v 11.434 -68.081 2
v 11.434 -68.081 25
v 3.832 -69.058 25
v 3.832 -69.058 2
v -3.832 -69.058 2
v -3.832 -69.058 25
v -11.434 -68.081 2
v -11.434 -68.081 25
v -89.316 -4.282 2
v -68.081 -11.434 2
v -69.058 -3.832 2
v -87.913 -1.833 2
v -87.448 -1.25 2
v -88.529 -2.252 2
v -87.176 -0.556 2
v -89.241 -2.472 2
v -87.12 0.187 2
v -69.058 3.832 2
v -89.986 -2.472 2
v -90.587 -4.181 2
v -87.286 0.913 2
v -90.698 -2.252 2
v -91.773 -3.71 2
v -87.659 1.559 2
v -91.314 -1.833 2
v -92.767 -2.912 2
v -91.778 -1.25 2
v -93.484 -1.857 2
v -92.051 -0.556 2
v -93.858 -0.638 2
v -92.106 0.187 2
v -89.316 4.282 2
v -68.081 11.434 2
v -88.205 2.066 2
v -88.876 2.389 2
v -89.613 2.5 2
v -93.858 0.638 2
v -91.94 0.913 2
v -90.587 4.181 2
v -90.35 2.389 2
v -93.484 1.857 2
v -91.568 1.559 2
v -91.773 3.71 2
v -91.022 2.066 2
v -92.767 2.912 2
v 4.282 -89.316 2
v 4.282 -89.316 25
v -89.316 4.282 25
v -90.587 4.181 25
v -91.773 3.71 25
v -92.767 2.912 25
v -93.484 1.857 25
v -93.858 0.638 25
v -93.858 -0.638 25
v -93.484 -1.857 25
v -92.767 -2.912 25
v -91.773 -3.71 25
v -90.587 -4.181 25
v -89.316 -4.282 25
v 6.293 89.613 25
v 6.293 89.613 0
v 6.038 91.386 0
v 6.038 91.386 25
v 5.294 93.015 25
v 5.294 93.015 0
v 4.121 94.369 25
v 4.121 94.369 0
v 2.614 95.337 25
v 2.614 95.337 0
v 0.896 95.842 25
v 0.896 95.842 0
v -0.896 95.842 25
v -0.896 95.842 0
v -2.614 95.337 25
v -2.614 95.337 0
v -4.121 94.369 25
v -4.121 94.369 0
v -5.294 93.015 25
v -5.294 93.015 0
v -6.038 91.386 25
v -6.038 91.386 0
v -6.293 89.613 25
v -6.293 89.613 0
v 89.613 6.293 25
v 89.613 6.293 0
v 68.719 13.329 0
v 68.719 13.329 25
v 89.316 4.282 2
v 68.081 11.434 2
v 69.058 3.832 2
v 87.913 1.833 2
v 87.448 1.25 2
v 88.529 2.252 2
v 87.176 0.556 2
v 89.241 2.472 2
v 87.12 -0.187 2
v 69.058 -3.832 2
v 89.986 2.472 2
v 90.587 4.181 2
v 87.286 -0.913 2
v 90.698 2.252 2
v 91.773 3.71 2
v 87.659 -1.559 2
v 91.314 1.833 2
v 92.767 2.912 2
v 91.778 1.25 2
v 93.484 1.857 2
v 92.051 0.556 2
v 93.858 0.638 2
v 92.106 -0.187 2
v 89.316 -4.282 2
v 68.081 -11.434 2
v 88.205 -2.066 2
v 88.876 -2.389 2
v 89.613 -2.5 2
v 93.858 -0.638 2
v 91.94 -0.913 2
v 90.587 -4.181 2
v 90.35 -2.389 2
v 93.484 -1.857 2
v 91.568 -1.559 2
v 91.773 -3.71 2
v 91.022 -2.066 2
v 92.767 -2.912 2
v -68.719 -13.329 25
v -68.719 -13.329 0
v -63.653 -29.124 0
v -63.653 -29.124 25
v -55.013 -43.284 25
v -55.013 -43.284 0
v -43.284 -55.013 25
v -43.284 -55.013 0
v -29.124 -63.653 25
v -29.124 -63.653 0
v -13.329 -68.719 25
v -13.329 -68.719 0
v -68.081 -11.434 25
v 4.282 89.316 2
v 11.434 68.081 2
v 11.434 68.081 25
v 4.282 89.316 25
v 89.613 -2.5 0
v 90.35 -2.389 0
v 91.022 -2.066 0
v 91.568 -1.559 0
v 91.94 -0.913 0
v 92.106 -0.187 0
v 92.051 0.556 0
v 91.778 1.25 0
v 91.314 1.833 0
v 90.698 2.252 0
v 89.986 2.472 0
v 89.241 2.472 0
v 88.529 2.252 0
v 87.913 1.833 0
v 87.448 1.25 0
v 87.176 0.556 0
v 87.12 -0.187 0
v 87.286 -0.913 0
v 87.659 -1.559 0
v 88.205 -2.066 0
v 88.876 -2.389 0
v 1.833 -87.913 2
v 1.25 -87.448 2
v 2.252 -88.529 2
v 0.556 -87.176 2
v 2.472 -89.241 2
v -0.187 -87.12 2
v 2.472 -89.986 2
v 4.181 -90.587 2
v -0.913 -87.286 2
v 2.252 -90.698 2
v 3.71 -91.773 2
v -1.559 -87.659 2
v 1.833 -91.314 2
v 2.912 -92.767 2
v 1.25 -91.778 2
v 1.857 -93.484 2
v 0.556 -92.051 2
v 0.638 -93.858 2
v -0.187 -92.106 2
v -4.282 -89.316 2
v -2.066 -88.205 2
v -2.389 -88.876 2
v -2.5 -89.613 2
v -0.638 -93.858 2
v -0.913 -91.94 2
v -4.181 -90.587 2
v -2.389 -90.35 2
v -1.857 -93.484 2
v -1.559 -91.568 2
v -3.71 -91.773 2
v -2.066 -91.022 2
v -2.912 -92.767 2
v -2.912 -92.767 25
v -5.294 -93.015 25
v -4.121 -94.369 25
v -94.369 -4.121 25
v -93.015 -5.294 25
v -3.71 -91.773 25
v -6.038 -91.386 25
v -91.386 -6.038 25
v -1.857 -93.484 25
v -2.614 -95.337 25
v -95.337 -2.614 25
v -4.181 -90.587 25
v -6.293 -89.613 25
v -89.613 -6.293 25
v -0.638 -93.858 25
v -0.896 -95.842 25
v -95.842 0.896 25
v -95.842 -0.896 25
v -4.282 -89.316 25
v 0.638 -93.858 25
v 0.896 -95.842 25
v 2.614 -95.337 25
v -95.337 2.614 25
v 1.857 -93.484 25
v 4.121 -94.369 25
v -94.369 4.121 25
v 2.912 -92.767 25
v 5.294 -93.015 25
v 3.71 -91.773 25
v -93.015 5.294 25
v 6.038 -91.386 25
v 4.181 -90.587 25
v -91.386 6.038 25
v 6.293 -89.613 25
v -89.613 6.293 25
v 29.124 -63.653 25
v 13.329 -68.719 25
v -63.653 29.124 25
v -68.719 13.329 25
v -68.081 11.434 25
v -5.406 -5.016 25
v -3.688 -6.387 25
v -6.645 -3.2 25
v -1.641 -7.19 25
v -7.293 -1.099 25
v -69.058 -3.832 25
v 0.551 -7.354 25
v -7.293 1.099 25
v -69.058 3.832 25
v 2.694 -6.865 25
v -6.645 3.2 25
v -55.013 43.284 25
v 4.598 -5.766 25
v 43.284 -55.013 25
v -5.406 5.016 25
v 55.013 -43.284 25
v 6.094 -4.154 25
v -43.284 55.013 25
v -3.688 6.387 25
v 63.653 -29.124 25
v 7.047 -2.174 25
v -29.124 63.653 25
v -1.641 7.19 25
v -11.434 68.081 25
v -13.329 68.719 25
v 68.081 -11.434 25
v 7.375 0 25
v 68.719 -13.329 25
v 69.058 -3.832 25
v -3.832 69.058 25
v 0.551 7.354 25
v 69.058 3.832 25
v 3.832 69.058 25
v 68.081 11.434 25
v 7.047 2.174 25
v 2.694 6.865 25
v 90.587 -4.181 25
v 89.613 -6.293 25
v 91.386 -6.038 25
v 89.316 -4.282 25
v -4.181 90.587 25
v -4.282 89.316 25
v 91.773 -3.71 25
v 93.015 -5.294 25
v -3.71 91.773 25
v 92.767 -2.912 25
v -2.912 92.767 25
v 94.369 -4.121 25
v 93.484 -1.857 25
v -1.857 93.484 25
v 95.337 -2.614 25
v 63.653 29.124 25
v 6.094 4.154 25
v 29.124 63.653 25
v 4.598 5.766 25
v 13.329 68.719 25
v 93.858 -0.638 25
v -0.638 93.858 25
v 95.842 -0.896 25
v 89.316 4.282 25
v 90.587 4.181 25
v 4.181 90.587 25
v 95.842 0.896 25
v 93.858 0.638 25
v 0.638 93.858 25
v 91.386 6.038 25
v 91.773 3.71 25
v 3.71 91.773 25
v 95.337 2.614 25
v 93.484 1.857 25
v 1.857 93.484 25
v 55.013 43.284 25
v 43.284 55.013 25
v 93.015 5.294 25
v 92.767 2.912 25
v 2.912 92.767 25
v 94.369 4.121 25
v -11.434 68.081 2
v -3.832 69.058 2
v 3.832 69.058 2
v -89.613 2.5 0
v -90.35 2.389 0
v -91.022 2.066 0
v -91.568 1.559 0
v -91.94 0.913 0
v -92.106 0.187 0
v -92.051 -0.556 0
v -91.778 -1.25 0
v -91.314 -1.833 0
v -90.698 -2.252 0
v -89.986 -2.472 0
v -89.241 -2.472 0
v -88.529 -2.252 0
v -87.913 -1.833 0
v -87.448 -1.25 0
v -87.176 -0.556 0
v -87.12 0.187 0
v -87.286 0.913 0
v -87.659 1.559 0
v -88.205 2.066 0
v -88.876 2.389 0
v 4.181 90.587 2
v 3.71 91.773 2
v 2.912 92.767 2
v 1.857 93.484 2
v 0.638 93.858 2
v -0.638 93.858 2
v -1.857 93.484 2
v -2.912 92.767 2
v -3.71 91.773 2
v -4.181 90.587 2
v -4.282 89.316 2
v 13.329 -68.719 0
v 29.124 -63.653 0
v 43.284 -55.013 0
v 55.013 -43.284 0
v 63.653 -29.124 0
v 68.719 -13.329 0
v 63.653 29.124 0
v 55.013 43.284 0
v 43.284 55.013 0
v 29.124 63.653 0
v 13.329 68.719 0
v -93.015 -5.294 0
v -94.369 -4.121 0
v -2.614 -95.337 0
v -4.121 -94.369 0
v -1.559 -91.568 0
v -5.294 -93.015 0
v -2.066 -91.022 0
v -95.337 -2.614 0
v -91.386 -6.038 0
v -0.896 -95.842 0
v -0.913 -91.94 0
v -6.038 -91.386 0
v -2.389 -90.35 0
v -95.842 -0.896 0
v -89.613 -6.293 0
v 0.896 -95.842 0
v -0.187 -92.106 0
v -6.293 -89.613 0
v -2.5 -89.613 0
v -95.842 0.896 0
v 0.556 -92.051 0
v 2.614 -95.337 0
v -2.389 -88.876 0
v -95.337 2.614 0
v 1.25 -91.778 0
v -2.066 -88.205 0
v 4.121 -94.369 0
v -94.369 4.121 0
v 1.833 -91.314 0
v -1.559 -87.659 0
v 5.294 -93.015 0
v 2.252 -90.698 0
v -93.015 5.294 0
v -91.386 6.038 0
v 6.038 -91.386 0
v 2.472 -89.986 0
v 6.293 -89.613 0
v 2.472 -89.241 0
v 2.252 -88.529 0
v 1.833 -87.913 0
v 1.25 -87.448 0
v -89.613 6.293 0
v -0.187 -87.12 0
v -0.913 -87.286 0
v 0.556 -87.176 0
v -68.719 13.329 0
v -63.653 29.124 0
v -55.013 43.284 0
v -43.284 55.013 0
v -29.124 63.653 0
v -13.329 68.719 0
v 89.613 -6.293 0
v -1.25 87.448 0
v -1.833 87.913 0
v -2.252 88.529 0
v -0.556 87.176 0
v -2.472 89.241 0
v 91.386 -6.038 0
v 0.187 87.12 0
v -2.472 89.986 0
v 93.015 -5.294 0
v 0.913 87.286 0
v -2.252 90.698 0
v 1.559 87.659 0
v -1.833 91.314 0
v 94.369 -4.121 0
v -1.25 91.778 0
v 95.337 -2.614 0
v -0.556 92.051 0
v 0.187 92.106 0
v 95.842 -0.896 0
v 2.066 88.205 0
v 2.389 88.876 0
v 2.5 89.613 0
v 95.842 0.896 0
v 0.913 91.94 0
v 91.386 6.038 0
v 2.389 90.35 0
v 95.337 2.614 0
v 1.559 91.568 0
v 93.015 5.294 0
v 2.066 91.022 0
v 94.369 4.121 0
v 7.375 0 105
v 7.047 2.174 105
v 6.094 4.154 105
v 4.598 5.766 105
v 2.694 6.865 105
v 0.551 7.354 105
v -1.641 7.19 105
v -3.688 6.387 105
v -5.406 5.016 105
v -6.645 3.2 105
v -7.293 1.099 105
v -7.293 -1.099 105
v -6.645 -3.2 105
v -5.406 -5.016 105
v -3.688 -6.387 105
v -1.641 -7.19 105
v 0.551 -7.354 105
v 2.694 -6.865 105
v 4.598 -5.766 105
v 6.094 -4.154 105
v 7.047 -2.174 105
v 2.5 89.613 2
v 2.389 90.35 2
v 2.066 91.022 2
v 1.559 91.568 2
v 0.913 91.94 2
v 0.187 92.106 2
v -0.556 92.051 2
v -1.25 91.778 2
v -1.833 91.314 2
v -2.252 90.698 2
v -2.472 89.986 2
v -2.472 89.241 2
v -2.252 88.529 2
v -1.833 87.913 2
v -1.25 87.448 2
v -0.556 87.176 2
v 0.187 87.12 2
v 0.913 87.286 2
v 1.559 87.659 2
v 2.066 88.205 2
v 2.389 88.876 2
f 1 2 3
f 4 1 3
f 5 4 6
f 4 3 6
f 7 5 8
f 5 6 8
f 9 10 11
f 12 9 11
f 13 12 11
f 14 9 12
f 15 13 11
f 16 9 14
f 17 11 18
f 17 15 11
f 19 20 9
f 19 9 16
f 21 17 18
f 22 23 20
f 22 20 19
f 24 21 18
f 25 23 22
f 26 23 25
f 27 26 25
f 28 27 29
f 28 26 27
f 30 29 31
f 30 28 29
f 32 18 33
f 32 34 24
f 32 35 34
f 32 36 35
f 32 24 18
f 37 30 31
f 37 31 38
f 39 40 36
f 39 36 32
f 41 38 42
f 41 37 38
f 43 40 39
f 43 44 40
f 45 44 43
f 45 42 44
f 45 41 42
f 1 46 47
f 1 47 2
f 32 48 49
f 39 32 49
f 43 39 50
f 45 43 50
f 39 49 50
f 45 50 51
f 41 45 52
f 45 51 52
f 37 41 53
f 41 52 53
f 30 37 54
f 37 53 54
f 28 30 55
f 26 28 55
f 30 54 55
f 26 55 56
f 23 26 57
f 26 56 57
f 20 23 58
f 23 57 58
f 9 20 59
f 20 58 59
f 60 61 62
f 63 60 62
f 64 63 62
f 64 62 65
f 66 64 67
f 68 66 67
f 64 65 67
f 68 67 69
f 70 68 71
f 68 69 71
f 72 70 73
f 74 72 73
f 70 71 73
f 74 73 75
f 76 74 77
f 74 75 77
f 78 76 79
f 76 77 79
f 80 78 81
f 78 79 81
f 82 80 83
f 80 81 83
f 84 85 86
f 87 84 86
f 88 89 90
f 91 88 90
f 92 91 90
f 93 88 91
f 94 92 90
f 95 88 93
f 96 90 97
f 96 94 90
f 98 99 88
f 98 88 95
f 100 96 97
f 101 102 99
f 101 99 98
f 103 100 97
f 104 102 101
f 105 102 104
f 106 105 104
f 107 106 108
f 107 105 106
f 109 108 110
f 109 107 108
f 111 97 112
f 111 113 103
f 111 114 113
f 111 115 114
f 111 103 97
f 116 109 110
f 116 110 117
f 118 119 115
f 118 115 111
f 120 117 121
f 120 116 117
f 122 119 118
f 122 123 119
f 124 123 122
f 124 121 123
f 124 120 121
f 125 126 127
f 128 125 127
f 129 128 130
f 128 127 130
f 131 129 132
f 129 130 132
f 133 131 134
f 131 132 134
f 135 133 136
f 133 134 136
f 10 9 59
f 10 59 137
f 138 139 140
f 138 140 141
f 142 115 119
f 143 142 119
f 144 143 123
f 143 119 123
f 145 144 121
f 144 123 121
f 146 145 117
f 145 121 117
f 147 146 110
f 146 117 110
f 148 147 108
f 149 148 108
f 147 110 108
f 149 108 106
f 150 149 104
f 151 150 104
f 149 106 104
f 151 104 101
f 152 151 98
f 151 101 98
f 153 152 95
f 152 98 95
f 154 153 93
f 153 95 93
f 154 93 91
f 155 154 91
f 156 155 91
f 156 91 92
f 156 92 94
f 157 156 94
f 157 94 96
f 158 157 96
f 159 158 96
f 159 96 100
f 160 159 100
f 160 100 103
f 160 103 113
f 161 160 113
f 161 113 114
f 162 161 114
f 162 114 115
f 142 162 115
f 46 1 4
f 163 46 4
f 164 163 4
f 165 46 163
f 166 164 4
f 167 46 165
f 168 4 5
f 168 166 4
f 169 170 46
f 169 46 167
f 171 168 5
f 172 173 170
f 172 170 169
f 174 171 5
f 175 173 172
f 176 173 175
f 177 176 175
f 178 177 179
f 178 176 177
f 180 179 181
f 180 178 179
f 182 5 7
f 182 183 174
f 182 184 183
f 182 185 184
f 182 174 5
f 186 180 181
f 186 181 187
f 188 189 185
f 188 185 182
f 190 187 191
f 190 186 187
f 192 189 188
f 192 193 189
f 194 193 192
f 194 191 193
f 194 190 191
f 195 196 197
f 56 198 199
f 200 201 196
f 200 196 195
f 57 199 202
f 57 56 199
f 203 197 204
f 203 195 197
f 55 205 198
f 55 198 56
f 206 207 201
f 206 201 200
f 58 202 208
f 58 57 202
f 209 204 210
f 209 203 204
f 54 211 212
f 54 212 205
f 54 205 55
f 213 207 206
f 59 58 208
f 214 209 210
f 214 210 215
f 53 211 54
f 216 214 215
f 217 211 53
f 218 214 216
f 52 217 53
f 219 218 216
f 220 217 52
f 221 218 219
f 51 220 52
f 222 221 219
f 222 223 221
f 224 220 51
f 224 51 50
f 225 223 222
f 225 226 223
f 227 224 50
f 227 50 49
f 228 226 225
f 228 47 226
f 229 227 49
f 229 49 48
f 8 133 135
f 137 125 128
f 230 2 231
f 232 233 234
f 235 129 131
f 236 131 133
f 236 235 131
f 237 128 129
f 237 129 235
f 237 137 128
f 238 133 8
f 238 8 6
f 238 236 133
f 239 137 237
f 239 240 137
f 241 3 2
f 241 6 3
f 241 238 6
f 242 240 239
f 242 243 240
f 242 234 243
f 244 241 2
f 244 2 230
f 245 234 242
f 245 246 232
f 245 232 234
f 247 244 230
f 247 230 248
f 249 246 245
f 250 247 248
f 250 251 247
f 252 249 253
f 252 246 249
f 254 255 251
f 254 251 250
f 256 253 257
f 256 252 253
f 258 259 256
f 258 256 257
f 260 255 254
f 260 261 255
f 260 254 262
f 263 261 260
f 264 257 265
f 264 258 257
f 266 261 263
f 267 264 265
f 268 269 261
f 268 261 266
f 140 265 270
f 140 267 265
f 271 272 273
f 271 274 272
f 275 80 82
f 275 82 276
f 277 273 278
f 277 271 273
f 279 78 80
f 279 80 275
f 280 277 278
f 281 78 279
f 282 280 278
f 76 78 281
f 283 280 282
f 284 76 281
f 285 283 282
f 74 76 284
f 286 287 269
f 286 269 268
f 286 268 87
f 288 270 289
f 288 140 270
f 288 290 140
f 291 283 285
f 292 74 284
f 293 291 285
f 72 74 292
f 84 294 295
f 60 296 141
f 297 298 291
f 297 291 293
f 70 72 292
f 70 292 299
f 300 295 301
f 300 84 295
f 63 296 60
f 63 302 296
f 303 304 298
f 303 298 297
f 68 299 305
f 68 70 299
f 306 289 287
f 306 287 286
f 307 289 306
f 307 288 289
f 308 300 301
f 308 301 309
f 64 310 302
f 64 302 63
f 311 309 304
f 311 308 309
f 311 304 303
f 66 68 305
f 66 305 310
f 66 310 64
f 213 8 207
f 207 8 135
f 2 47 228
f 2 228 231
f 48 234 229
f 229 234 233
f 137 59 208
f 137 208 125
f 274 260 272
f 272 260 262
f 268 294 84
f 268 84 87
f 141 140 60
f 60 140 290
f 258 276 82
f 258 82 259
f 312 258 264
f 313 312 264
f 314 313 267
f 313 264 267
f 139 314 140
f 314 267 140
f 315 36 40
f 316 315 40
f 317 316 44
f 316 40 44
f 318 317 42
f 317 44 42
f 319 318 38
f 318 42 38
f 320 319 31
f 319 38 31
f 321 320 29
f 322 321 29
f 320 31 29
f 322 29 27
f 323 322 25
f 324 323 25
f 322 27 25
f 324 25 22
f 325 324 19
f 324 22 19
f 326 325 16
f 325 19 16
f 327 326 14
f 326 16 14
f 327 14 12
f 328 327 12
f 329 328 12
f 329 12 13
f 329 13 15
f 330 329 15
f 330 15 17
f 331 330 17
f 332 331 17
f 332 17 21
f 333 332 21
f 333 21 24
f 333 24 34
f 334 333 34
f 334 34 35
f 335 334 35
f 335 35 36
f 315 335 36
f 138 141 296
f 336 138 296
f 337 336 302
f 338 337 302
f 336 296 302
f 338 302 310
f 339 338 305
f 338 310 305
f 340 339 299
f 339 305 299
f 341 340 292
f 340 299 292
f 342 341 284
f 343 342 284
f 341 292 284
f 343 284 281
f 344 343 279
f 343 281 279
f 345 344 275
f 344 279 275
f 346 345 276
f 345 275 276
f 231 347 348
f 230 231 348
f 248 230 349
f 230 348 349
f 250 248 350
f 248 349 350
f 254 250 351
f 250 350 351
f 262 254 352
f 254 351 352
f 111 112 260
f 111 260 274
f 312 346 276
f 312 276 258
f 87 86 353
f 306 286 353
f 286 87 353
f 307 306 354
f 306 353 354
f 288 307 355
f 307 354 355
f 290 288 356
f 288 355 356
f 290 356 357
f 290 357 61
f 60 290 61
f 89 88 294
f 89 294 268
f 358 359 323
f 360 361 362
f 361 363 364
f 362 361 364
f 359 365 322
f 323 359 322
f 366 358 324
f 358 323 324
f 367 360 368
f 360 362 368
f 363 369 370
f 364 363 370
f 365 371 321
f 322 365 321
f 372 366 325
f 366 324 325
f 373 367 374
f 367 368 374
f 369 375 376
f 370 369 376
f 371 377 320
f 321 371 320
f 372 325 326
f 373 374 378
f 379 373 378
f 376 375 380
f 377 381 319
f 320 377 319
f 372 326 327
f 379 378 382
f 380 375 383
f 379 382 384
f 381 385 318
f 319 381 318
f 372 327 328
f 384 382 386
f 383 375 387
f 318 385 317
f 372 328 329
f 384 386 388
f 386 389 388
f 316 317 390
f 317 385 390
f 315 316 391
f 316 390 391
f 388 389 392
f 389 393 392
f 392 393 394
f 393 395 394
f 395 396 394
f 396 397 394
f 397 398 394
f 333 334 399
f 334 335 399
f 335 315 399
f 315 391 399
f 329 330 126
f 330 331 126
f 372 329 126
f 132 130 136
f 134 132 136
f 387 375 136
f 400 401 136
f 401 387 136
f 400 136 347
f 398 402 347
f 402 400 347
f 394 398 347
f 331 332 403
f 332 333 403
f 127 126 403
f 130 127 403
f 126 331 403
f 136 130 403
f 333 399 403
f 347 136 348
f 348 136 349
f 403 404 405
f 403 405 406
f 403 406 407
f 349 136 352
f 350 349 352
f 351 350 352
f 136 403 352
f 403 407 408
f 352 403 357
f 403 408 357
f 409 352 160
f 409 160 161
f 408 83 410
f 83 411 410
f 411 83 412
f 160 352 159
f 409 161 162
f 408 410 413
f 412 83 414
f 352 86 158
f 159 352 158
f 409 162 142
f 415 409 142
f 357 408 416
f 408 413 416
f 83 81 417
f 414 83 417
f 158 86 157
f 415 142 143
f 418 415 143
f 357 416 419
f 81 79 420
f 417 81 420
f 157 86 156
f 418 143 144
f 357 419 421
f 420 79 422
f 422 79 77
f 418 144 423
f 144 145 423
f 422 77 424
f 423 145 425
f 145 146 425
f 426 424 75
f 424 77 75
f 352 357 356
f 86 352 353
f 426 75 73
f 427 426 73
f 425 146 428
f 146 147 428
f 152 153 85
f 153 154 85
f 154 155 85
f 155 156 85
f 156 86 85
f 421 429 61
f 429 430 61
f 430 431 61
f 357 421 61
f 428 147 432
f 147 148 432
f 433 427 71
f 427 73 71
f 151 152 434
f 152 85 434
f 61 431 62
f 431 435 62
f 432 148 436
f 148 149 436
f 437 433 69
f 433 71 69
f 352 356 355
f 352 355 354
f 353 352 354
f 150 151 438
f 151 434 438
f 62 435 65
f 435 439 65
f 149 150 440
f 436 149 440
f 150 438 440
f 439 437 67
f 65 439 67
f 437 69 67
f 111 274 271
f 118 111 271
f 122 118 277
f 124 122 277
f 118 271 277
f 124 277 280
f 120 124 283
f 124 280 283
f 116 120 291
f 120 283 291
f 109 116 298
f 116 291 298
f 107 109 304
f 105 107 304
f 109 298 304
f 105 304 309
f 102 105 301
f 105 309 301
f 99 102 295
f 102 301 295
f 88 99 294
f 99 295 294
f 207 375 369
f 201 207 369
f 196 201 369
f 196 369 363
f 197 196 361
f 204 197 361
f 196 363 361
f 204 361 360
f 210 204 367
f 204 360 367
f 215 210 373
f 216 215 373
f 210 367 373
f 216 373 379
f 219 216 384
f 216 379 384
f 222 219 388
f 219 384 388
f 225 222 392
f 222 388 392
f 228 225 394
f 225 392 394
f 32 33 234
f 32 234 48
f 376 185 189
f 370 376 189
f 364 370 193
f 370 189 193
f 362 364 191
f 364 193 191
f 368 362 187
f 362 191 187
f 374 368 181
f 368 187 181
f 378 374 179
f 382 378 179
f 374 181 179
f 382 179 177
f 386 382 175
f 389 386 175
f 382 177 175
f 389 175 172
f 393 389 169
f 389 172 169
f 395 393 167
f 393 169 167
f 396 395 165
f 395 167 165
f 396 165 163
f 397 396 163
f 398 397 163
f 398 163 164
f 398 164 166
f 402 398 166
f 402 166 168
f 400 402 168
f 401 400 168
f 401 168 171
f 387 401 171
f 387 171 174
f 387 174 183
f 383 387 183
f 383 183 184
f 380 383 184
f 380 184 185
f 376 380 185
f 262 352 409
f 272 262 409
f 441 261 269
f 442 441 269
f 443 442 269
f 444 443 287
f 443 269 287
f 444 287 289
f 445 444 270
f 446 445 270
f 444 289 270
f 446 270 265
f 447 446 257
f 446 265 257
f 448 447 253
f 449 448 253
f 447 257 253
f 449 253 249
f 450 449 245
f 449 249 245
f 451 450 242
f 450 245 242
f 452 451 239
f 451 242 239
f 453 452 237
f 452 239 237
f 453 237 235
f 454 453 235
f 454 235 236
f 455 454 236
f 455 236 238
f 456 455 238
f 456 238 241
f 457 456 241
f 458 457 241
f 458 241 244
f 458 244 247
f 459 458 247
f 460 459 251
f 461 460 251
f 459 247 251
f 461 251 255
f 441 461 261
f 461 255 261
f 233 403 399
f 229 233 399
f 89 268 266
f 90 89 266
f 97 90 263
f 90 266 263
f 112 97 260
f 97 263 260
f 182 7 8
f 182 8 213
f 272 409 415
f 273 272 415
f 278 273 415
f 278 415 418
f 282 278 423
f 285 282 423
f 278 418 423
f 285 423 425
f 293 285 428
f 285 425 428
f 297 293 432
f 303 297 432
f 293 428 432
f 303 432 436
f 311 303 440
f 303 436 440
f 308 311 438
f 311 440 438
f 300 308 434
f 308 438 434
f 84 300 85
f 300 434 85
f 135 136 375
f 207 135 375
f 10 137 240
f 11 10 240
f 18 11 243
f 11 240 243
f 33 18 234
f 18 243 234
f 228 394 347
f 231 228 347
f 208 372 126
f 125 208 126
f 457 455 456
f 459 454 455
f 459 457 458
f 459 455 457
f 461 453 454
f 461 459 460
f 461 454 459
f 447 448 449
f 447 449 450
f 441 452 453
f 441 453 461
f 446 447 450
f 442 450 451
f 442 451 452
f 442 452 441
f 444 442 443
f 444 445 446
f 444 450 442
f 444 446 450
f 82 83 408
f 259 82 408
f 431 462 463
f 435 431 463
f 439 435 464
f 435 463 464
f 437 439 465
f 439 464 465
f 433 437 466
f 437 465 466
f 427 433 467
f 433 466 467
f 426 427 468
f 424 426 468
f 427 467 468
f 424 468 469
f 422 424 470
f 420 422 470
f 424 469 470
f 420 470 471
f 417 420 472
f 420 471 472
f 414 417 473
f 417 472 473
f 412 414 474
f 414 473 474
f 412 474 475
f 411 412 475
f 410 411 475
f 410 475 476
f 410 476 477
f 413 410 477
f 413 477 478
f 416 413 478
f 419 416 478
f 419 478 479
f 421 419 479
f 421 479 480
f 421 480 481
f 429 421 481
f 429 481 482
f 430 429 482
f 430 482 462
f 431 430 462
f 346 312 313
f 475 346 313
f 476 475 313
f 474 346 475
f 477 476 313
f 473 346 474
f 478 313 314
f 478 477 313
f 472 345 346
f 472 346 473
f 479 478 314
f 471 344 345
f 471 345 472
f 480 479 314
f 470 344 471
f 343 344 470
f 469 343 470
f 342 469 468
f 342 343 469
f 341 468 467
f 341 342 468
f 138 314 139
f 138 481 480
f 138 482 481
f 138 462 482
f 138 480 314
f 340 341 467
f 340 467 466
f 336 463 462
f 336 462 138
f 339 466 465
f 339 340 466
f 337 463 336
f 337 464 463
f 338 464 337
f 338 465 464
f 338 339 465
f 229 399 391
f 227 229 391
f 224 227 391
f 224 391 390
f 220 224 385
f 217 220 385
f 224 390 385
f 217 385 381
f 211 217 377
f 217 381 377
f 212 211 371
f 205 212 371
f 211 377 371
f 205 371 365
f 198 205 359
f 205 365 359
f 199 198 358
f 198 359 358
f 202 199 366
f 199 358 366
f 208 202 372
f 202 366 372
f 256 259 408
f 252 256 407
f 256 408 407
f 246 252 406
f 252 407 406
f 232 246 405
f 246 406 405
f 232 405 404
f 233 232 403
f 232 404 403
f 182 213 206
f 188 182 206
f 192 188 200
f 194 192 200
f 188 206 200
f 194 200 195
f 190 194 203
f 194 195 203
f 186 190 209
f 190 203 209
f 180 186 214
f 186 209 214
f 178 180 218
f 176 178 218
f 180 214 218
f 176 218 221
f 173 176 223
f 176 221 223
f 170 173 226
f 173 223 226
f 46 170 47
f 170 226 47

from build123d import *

# Parameters (mm, degrees)
SKETCH1_R           = 70
BOSS_EXTRUDE1_DEPTH = 25
BOSS_EXTRUDE3_DEPTH = 25
CUT_EXTRUDE1_DEPTH  = 23
CUT_EXTRUDE2_REACH  = 122.942
SKETCH6_R           = 2.5
CIRPATTERN2_COUNT   = 4
SKETCH7_R           = 7.375
BOSS_EXTRUDE4_DEPTH = 80


with BuildPart() as part:
    # Sketch1 → Boss-Extrude1 (new body)
    with BuildSketch(Plane.XY):
        Circle(SKETCH1_R)
    extrude(amount=BOSS_EXTRUDE1_DEPTH)

    # Sketch3 → Boss-Extrude3 (add)
    with BuildSketch(Plane.XY):
        with BuildLine():
            Line((13.329299006, 68.719209745), (6.292622314, 89.613315607))
            ThreePointArc((6.292622314, 89.613315607), (0, 95.90593792), (-6.292622314, 89.613315607))
            Line((-6.292622314, 89.613315607), (-13.329299006, 68.719209745))
            ThreePointArc((-13.329299006, 68.719209745), (0, 70), (13.329299006, 68.719209745))
        make_face()
    boss_extrude3 = extrude(amount=BOSS_EXTRUDE3_DEPTH)

    # Sketch5 → Cut-Extrude1 (cut)
    with BuildSketch(Plane.XY.offset(25)):
        with BuildLine():
            Line((11.433900255, 68.080881008), (4.282324573, 89.316158104))
            ThreePointArc((4.282324573, 89.316158104), (0, 93.90593792), (-4.282324573, 89.316158104))
            Line((-4.282324573, 89.316158104), (-11.433900255, 68.080881008))
            ThreePointArc((-11.433900255, 68.080881008), (0, 69.180406265), (11.433900255, 68.080881008))
        make_face()
    cut_extrude1 = extrude(amount=-CUT_EXTRUDE1_DEPTH, mode=Mode.SUBTRACT)

    # Sketch6 → Cut-Extrude2 (cut, up to next)
    with BuildSketch(Plane.XY.offset(2), mode=Mode.PRIVATE) as cut_extrude2_sk1:
        with Locations((0, 89.613315607)):
            Circle(SKETCH6_R)
    cut_extrude2_tool1 = extrude(cut_extrude2_sk1.sketch, amount=-CUT_EXTRUDE2_REACH, mode=Mode.PRIVATE) & part.part
    cut_extrude2 = cut_extrude2_tool1.solids().sort_by_distance((0, 89.613316, 2))[0]
    add(cut_extrude2, mode=Mode.SUBTRACT)

    # CirPattern2: Boss-Extrude3, Cut-Extrude1, Cut-Extrude2 ×4 about axis
    cirpattern2_axis = Axis((0, 0, 0), (0, 0, 1))
    add([boss_extrude3.rotate(cirpattern2_axis, i * 360 / CIRPATTERN2_COUNT) for i in range(1, CIRPATTERN2_COUNT)])
    add([cut_extrude1.rotate(cirpattern2_axis, i * 360 / CIRPATTERN2_COUNT) for i in range(1, CIRPATTERN2_COUNT)], mode=Mode.SUBTRACT)
    add([cut_extrude2.rotate(cirpattern2_axis, i * 360 / CIRPATTERN2_COUNT) for i in range(1, CIRPATTERN2_COUNT)], mode=Mode.SUBTRACT)

    # Sketch7 → Boss-Extrude4 (add)
    with BuildSketch(Plane.XY.offset(25)):
        Circle(SKETCH7_R)
    extrude(amount=BOSS_EXTRUDE4_DEPTH)


solid = part.part
